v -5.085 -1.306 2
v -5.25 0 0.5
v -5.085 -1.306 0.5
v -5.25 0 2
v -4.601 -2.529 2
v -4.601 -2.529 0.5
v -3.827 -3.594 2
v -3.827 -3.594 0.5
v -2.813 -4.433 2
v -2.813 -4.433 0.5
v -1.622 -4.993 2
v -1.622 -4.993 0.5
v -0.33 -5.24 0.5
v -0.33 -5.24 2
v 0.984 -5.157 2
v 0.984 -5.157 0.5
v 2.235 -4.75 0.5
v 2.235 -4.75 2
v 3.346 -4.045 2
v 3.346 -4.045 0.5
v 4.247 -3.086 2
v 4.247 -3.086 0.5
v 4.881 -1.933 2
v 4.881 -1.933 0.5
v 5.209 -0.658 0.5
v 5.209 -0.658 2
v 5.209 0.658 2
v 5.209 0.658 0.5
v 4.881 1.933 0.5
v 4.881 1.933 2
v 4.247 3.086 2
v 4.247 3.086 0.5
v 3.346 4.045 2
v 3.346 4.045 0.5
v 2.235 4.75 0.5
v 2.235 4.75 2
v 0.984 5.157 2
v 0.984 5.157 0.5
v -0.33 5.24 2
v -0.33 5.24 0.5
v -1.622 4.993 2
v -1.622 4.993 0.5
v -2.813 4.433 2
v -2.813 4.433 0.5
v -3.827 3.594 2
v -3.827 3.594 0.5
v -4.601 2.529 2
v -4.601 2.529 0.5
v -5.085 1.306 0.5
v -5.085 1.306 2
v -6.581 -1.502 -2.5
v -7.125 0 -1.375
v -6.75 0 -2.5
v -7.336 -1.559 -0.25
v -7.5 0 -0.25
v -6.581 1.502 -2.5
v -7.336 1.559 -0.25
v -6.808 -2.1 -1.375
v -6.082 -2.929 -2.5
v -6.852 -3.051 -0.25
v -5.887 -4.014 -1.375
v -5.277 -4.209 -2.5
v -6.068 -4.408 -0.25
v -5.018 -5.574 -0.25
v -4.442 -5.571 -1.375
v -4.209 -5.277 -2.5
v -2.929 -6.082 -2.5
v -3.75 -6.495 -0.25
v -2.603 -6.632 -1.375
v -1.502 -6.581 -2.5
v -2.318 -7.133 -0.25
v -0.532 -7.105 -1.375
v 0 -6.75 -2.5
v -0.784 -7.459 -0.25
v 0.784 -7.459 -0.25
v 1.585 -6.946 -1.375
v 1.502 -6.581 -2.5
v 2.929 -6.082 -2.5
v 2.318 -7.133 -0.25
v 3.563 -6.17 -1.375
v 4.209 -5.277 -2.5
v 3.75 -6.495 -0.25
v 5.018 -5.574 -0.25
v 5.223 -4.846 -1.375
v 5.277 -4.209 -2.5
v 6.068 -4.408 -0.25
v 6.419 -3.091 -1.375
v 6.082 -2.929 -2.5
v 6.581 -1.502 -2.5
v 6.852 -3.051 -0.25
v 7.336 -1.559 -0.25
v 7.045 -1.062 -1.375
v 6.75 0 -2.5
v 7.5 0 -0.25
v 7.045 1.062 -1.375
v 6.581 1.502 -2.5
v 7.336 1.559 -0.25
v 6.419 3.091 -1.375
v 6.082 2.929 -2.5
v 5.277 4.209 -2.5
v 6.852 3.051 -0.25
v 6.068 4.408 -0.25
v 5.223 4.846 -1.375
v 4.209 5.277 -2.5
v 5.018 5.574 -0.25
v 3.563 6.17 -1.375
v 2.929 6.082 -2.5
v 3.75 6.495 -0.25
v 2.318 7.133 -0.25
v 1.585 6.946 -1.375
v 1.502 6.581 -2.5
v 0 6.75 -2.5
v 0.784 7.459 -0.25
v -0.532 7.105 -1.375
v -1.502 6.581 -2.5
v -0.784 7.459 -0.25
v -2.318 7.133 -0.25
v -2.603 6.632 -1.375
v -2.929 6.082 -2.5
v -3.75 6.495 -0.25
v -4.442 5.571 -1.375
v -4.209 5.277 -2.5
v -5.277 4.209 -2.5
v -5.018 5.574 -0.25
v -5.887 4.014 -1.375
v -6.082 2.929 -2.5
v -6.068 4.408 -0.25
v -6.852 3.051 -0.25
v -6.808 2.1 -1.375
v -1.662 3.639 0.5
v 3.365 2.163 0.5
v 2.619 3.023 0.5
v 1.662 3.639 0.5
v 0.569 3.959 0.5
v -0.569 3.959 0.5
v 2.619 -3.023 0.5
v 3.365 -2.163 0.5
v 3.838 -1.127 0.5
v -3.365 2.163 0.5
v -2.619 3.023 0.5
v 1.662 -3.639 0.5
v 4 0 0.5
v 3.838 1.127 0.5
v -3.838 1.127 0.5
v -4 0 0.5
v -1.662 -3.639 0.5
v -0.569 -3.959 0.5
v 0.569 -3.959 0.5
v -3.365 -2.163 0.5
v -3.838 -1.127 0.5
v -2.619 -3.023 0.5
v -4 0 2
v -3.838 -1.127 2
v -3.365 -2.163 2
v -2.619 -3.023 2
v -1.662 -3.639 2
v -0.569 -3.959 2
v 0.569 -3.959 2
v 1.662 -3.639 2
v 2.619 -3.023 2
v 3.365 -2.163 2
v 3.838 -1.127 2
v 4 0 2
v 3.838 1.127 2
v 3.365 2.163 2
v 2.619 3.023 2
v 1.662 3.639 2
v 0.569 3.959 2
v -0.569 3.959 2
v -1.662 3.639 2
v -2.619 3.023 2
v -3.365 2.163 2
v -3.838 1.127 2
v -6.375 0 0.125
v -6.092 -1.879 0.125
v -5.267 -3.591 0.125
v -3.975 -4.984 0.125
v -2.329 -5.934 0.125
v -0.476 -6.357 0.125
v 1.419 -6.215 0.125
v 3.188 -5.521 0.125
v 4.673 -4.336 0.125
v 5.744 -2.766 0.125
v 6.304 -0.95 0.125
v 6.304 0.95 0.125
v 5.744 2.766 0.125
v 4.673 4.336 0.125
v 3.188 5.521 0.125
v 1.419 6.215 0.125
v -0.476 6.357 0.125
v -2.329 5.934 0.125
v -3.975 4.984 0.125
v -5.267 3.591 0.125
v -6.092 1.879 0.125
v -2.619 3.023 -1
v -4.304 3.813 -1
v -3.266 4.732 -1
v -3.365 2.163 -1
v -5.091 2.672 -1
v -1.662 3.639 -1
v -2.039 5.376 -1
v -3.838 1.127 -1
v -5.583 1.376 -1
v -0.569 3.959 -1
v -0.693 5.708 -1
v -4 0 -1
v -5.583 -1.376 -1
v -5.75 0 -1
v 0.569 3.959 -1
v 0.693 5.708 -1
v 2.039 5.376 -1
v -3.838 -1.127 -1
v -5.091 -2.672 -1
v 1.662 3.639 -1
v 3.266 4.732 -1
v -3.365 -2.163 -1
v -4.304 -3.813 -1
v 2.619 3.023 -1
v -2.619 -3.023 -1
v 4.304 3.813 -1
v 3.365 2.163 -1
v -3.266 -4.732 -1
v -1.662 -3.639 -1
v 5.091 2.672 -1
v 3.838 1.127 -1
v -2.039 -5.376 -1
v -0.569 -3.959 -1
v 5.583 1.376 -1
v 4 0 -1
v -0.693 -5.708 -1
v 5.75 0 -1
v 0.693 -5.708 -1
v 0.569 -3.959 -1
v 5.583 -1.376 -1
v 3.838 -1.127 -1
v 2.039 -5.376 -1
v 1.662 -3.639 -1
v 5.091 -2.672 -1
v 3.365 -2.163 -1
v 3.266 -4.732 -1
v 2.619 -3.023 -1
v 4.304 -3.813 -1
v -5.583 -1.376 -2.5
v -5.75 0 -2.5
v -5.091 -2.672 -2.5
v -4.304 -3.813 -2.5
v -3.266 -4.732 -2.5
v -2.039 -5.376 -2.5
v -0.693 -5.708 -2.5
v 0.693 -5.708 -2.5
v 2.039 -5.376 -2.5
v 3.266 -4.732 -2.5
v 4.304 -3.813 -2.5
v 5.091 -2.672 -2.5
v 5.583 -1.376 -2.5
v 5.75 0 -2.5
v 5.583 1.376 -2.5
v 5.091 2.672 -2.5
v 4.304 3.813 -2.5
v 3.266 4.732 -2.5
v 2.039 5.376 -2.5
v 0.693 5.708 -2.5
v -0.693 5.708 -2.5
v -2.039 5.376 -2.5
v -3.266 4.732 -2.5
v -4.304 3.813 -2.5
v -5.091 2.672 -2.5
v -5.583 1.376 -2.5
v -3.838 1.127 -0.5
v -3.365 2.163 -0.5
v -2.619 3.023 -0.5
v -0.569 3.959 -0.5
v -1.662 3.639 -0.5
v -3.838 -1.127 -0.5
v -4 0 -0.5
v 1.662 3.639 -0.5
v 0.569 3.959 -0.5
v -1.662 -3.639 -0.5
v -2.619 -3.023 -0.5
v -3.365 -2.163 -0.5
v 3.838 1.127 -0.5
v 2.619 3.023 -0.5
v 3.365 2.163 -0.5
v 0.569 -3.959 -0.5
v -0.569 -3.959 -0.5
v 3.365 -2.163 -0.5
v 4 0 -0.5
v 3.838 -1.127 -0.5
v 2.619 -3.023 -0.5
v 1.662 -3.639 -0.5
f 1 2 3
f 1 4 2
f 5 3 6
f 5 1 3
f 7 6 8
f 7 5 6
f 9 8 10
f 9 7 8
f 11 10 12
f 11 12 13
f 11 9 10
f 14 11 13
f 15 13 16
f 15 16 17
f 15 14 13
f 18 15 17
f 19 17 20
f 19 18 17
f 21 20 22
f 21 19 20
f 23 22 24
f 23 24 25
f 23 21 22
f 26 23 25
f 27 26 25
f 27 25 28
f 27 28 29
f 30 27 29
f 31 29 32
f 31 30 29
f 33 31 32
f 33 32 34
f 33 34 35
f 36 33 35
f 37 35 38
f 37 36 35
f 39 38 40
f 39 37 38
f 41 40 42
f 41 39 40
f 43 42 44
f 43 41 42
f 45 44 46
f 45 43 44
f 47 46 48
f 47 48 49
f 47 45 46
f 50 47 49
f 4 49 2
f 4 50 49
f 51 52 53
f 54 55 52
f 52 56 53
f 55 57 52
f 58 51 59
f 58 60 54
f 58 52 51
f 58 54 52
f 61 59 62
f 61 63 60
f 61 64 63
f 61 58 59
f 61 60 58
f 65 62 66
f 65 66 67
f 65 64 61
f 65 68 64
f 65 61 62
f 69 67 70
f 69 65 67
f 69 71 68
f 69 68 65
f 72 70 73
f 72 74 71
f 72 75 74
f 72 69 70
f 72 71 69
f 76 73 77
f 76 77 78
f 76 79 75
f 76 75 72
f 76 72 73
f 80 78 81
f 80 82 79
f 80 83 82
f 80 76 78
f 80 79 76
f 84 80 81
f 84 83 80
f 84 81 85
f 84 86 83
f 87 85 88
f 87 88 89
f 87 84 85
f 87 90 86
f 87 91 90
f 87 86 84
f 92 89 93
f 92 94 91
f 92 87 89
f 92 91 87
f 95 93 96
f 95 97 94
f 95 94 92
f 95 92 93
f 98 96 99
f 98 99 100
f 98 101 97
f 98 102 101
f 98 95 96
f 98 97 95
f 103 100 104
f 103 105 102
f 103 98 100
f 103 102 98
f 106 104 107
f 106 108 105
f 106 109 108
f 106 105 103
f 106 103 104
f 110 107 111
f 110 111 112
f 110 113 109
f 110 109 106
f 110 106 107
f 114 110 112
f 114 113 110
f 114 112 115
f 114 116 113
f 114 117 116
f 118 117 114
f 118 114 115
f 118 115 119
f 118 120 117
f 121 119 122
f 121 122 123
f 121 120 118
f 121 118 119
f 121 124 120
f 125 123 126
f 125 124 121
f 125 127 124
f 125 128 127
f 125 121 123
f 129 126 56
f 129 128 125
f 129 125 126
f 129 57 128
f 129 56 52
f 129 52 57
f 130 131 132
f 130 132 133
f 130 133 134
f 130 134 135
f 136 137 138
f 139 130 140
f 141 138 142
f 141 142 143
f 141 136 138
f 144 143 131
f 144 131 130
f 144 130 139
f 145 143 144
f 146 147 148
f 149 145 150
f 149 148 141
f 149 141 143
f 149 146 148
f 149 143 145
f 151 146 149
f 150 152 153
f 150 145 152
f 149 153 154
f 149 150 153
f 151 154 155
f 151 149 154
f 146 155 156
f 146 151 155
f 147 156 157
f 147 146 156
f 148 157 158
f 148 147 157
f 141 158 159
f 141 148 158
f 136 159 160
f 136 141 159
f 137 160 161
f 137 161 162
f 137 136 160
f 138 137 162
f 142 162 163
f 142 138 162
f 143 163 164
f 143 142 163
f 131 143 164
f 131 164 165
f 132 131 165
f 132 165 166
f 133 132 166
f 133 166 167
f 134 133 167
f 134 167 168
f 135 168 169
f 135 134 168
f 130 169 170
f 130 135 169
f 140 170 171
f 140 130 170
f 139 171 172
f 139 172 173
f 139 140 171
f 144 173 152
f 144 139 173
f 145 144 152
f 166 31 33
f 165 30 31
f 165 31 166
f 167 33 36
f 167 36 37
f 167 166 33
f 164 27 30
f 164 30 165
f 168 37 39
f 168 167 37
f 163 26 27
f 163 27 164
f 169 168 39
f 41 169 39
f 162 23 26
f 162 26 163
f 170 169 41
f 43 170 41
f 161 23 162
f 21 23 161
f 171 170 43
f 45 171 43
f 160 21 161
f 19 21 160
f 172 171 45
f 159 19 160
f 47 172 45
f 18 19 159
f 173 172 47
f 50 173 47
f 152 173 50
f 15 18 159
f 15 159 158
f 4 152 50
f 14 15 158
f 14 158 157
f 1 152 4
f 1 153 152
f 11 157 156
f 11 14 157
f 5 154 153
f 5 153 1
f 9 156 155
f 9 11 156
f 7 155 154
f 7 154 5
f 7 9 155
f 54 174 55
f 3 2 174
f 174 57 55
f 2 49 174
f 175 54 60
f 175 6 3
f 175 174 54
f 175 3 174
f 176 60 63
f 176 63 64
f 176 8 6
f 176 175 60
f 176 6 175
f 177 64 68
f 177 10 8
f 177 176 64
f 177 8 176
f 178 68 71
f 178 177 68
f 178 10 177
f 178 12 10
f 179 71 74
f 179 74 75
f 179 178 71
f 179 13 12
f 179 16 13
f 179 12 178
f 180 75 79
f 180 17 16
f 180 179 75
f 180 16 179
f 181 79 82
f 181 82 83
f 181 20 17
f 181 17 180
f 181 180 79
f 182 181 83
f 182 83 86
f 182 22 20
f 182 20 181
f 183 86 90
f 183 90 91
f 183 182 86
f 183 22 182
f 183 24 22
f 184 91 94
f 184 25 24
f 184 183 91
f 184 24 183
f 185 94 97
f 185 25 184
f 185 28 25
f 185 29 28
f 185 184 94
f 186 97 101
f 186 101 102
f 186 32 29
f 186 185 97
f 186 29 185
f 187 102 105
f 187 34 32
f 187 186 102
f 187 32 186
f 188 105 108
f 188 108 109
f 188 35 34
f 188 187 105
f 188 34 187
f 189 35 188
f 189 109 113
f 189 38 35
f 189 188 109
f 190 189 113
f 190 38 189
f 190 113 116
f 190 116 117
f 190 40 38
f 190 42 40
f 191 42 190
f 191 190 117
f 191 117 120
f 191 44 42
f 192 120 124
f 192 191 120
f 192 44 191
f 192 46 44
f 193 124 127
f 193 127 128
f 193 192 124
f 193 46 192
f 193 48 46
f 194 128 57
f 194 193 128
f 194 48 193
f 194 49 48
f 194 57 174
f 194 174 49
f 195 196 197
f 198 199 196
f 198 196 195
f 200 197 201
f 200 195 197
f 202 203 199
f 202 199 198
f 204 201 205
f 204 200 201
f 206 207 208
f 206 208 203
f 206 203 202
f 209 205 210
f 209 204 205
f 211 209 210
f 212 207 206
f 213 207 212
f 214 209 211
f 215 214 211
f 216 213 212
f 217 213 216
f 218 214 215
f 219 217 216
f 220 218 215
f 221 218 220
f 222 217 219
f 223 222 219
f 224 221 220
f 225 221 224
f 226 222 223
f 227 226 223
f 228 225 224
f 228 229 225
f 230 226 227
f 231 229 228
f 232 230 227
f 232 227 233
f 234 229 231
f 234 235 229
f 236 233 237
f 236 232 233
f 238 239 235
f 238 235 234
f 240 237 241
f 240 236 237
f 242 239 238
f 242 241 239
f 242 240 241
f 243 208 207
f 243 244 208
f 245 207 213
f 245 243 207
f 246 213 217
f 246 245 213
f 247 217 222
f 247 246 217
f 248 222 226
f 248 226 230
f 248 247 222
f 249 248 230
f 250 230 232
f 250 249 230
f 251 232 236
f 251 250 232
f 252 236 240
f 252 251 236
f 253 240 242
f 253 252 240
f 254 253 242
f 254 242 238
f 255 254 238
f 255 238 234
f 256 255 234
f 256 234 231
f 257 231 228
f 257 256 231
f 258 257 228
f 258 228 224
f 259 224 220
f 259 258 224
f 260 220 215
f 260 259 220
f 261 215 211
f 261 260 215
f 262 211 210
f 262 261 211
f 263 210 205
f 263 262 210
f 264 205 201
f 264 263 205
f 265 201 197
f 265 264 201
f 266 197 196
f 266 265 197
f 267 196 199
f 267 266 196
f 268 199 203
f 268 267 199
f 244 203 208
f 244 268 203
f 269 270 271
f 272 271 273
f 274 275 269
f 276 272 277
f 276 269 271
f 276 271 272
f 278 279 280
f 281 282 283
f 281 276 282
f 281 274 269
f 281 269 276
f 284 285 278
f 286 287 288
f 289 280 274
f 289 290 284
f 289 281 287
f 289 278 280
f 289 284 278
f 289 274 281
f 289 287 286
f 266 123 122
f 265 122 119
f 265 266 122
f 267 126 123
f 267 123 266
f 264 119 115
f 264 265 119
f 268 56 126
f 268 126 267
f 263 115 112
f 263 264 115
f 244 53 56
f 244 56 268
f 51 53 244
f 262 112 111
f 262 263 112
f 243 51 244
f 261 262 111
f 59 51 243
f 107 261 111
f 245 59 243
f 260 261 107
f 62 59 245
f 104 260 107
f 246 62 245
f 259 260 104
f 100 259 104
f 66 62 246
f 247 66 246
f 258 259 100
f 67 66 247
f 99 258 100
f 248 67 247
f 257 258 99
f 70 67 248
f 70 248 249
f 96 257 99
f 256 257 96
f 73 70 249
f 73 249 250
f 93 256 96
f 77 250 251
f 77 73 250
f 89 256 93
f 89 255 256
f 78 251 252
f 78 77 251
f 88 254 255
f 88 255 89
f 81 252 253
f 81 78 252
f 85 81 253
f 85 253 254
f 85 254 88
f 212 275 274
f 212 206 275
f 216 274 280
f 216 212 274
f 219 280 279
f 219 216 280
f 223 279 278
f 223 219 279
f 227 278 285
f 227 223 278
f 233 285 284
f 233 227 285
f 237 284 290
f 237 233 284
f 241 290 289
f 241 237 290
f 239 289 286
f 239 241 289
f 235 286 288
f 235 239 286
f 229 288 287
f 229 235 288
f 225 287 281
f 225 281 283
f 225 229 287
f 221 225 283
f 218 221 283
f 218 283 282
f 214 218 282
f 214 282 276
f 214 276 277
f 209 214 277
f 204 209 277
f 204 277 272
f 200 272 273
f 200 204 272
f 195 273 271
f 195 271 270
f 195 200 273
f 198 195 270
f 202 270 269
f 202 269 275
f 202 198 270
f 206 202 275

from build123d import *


with BuildPart() as part:
    # Sketch → Revolution (revolve)
    with BuildSketch(Plane.XZ):
        Polygon((-7.5, -0.25), (-5.25, 0.5), (-5.25, 2), (-4, 2), (-4, 0.5), (0, 0.5), (0, -0.5), (-4, -0.5), (-4, -1), (-5.75, -1), (-5.75, -2.5), (-6.75, -2.5), align=None)
    revolve(axis=Axis((0, 0, 0), (0, 0, 1)))


solid = part.part
